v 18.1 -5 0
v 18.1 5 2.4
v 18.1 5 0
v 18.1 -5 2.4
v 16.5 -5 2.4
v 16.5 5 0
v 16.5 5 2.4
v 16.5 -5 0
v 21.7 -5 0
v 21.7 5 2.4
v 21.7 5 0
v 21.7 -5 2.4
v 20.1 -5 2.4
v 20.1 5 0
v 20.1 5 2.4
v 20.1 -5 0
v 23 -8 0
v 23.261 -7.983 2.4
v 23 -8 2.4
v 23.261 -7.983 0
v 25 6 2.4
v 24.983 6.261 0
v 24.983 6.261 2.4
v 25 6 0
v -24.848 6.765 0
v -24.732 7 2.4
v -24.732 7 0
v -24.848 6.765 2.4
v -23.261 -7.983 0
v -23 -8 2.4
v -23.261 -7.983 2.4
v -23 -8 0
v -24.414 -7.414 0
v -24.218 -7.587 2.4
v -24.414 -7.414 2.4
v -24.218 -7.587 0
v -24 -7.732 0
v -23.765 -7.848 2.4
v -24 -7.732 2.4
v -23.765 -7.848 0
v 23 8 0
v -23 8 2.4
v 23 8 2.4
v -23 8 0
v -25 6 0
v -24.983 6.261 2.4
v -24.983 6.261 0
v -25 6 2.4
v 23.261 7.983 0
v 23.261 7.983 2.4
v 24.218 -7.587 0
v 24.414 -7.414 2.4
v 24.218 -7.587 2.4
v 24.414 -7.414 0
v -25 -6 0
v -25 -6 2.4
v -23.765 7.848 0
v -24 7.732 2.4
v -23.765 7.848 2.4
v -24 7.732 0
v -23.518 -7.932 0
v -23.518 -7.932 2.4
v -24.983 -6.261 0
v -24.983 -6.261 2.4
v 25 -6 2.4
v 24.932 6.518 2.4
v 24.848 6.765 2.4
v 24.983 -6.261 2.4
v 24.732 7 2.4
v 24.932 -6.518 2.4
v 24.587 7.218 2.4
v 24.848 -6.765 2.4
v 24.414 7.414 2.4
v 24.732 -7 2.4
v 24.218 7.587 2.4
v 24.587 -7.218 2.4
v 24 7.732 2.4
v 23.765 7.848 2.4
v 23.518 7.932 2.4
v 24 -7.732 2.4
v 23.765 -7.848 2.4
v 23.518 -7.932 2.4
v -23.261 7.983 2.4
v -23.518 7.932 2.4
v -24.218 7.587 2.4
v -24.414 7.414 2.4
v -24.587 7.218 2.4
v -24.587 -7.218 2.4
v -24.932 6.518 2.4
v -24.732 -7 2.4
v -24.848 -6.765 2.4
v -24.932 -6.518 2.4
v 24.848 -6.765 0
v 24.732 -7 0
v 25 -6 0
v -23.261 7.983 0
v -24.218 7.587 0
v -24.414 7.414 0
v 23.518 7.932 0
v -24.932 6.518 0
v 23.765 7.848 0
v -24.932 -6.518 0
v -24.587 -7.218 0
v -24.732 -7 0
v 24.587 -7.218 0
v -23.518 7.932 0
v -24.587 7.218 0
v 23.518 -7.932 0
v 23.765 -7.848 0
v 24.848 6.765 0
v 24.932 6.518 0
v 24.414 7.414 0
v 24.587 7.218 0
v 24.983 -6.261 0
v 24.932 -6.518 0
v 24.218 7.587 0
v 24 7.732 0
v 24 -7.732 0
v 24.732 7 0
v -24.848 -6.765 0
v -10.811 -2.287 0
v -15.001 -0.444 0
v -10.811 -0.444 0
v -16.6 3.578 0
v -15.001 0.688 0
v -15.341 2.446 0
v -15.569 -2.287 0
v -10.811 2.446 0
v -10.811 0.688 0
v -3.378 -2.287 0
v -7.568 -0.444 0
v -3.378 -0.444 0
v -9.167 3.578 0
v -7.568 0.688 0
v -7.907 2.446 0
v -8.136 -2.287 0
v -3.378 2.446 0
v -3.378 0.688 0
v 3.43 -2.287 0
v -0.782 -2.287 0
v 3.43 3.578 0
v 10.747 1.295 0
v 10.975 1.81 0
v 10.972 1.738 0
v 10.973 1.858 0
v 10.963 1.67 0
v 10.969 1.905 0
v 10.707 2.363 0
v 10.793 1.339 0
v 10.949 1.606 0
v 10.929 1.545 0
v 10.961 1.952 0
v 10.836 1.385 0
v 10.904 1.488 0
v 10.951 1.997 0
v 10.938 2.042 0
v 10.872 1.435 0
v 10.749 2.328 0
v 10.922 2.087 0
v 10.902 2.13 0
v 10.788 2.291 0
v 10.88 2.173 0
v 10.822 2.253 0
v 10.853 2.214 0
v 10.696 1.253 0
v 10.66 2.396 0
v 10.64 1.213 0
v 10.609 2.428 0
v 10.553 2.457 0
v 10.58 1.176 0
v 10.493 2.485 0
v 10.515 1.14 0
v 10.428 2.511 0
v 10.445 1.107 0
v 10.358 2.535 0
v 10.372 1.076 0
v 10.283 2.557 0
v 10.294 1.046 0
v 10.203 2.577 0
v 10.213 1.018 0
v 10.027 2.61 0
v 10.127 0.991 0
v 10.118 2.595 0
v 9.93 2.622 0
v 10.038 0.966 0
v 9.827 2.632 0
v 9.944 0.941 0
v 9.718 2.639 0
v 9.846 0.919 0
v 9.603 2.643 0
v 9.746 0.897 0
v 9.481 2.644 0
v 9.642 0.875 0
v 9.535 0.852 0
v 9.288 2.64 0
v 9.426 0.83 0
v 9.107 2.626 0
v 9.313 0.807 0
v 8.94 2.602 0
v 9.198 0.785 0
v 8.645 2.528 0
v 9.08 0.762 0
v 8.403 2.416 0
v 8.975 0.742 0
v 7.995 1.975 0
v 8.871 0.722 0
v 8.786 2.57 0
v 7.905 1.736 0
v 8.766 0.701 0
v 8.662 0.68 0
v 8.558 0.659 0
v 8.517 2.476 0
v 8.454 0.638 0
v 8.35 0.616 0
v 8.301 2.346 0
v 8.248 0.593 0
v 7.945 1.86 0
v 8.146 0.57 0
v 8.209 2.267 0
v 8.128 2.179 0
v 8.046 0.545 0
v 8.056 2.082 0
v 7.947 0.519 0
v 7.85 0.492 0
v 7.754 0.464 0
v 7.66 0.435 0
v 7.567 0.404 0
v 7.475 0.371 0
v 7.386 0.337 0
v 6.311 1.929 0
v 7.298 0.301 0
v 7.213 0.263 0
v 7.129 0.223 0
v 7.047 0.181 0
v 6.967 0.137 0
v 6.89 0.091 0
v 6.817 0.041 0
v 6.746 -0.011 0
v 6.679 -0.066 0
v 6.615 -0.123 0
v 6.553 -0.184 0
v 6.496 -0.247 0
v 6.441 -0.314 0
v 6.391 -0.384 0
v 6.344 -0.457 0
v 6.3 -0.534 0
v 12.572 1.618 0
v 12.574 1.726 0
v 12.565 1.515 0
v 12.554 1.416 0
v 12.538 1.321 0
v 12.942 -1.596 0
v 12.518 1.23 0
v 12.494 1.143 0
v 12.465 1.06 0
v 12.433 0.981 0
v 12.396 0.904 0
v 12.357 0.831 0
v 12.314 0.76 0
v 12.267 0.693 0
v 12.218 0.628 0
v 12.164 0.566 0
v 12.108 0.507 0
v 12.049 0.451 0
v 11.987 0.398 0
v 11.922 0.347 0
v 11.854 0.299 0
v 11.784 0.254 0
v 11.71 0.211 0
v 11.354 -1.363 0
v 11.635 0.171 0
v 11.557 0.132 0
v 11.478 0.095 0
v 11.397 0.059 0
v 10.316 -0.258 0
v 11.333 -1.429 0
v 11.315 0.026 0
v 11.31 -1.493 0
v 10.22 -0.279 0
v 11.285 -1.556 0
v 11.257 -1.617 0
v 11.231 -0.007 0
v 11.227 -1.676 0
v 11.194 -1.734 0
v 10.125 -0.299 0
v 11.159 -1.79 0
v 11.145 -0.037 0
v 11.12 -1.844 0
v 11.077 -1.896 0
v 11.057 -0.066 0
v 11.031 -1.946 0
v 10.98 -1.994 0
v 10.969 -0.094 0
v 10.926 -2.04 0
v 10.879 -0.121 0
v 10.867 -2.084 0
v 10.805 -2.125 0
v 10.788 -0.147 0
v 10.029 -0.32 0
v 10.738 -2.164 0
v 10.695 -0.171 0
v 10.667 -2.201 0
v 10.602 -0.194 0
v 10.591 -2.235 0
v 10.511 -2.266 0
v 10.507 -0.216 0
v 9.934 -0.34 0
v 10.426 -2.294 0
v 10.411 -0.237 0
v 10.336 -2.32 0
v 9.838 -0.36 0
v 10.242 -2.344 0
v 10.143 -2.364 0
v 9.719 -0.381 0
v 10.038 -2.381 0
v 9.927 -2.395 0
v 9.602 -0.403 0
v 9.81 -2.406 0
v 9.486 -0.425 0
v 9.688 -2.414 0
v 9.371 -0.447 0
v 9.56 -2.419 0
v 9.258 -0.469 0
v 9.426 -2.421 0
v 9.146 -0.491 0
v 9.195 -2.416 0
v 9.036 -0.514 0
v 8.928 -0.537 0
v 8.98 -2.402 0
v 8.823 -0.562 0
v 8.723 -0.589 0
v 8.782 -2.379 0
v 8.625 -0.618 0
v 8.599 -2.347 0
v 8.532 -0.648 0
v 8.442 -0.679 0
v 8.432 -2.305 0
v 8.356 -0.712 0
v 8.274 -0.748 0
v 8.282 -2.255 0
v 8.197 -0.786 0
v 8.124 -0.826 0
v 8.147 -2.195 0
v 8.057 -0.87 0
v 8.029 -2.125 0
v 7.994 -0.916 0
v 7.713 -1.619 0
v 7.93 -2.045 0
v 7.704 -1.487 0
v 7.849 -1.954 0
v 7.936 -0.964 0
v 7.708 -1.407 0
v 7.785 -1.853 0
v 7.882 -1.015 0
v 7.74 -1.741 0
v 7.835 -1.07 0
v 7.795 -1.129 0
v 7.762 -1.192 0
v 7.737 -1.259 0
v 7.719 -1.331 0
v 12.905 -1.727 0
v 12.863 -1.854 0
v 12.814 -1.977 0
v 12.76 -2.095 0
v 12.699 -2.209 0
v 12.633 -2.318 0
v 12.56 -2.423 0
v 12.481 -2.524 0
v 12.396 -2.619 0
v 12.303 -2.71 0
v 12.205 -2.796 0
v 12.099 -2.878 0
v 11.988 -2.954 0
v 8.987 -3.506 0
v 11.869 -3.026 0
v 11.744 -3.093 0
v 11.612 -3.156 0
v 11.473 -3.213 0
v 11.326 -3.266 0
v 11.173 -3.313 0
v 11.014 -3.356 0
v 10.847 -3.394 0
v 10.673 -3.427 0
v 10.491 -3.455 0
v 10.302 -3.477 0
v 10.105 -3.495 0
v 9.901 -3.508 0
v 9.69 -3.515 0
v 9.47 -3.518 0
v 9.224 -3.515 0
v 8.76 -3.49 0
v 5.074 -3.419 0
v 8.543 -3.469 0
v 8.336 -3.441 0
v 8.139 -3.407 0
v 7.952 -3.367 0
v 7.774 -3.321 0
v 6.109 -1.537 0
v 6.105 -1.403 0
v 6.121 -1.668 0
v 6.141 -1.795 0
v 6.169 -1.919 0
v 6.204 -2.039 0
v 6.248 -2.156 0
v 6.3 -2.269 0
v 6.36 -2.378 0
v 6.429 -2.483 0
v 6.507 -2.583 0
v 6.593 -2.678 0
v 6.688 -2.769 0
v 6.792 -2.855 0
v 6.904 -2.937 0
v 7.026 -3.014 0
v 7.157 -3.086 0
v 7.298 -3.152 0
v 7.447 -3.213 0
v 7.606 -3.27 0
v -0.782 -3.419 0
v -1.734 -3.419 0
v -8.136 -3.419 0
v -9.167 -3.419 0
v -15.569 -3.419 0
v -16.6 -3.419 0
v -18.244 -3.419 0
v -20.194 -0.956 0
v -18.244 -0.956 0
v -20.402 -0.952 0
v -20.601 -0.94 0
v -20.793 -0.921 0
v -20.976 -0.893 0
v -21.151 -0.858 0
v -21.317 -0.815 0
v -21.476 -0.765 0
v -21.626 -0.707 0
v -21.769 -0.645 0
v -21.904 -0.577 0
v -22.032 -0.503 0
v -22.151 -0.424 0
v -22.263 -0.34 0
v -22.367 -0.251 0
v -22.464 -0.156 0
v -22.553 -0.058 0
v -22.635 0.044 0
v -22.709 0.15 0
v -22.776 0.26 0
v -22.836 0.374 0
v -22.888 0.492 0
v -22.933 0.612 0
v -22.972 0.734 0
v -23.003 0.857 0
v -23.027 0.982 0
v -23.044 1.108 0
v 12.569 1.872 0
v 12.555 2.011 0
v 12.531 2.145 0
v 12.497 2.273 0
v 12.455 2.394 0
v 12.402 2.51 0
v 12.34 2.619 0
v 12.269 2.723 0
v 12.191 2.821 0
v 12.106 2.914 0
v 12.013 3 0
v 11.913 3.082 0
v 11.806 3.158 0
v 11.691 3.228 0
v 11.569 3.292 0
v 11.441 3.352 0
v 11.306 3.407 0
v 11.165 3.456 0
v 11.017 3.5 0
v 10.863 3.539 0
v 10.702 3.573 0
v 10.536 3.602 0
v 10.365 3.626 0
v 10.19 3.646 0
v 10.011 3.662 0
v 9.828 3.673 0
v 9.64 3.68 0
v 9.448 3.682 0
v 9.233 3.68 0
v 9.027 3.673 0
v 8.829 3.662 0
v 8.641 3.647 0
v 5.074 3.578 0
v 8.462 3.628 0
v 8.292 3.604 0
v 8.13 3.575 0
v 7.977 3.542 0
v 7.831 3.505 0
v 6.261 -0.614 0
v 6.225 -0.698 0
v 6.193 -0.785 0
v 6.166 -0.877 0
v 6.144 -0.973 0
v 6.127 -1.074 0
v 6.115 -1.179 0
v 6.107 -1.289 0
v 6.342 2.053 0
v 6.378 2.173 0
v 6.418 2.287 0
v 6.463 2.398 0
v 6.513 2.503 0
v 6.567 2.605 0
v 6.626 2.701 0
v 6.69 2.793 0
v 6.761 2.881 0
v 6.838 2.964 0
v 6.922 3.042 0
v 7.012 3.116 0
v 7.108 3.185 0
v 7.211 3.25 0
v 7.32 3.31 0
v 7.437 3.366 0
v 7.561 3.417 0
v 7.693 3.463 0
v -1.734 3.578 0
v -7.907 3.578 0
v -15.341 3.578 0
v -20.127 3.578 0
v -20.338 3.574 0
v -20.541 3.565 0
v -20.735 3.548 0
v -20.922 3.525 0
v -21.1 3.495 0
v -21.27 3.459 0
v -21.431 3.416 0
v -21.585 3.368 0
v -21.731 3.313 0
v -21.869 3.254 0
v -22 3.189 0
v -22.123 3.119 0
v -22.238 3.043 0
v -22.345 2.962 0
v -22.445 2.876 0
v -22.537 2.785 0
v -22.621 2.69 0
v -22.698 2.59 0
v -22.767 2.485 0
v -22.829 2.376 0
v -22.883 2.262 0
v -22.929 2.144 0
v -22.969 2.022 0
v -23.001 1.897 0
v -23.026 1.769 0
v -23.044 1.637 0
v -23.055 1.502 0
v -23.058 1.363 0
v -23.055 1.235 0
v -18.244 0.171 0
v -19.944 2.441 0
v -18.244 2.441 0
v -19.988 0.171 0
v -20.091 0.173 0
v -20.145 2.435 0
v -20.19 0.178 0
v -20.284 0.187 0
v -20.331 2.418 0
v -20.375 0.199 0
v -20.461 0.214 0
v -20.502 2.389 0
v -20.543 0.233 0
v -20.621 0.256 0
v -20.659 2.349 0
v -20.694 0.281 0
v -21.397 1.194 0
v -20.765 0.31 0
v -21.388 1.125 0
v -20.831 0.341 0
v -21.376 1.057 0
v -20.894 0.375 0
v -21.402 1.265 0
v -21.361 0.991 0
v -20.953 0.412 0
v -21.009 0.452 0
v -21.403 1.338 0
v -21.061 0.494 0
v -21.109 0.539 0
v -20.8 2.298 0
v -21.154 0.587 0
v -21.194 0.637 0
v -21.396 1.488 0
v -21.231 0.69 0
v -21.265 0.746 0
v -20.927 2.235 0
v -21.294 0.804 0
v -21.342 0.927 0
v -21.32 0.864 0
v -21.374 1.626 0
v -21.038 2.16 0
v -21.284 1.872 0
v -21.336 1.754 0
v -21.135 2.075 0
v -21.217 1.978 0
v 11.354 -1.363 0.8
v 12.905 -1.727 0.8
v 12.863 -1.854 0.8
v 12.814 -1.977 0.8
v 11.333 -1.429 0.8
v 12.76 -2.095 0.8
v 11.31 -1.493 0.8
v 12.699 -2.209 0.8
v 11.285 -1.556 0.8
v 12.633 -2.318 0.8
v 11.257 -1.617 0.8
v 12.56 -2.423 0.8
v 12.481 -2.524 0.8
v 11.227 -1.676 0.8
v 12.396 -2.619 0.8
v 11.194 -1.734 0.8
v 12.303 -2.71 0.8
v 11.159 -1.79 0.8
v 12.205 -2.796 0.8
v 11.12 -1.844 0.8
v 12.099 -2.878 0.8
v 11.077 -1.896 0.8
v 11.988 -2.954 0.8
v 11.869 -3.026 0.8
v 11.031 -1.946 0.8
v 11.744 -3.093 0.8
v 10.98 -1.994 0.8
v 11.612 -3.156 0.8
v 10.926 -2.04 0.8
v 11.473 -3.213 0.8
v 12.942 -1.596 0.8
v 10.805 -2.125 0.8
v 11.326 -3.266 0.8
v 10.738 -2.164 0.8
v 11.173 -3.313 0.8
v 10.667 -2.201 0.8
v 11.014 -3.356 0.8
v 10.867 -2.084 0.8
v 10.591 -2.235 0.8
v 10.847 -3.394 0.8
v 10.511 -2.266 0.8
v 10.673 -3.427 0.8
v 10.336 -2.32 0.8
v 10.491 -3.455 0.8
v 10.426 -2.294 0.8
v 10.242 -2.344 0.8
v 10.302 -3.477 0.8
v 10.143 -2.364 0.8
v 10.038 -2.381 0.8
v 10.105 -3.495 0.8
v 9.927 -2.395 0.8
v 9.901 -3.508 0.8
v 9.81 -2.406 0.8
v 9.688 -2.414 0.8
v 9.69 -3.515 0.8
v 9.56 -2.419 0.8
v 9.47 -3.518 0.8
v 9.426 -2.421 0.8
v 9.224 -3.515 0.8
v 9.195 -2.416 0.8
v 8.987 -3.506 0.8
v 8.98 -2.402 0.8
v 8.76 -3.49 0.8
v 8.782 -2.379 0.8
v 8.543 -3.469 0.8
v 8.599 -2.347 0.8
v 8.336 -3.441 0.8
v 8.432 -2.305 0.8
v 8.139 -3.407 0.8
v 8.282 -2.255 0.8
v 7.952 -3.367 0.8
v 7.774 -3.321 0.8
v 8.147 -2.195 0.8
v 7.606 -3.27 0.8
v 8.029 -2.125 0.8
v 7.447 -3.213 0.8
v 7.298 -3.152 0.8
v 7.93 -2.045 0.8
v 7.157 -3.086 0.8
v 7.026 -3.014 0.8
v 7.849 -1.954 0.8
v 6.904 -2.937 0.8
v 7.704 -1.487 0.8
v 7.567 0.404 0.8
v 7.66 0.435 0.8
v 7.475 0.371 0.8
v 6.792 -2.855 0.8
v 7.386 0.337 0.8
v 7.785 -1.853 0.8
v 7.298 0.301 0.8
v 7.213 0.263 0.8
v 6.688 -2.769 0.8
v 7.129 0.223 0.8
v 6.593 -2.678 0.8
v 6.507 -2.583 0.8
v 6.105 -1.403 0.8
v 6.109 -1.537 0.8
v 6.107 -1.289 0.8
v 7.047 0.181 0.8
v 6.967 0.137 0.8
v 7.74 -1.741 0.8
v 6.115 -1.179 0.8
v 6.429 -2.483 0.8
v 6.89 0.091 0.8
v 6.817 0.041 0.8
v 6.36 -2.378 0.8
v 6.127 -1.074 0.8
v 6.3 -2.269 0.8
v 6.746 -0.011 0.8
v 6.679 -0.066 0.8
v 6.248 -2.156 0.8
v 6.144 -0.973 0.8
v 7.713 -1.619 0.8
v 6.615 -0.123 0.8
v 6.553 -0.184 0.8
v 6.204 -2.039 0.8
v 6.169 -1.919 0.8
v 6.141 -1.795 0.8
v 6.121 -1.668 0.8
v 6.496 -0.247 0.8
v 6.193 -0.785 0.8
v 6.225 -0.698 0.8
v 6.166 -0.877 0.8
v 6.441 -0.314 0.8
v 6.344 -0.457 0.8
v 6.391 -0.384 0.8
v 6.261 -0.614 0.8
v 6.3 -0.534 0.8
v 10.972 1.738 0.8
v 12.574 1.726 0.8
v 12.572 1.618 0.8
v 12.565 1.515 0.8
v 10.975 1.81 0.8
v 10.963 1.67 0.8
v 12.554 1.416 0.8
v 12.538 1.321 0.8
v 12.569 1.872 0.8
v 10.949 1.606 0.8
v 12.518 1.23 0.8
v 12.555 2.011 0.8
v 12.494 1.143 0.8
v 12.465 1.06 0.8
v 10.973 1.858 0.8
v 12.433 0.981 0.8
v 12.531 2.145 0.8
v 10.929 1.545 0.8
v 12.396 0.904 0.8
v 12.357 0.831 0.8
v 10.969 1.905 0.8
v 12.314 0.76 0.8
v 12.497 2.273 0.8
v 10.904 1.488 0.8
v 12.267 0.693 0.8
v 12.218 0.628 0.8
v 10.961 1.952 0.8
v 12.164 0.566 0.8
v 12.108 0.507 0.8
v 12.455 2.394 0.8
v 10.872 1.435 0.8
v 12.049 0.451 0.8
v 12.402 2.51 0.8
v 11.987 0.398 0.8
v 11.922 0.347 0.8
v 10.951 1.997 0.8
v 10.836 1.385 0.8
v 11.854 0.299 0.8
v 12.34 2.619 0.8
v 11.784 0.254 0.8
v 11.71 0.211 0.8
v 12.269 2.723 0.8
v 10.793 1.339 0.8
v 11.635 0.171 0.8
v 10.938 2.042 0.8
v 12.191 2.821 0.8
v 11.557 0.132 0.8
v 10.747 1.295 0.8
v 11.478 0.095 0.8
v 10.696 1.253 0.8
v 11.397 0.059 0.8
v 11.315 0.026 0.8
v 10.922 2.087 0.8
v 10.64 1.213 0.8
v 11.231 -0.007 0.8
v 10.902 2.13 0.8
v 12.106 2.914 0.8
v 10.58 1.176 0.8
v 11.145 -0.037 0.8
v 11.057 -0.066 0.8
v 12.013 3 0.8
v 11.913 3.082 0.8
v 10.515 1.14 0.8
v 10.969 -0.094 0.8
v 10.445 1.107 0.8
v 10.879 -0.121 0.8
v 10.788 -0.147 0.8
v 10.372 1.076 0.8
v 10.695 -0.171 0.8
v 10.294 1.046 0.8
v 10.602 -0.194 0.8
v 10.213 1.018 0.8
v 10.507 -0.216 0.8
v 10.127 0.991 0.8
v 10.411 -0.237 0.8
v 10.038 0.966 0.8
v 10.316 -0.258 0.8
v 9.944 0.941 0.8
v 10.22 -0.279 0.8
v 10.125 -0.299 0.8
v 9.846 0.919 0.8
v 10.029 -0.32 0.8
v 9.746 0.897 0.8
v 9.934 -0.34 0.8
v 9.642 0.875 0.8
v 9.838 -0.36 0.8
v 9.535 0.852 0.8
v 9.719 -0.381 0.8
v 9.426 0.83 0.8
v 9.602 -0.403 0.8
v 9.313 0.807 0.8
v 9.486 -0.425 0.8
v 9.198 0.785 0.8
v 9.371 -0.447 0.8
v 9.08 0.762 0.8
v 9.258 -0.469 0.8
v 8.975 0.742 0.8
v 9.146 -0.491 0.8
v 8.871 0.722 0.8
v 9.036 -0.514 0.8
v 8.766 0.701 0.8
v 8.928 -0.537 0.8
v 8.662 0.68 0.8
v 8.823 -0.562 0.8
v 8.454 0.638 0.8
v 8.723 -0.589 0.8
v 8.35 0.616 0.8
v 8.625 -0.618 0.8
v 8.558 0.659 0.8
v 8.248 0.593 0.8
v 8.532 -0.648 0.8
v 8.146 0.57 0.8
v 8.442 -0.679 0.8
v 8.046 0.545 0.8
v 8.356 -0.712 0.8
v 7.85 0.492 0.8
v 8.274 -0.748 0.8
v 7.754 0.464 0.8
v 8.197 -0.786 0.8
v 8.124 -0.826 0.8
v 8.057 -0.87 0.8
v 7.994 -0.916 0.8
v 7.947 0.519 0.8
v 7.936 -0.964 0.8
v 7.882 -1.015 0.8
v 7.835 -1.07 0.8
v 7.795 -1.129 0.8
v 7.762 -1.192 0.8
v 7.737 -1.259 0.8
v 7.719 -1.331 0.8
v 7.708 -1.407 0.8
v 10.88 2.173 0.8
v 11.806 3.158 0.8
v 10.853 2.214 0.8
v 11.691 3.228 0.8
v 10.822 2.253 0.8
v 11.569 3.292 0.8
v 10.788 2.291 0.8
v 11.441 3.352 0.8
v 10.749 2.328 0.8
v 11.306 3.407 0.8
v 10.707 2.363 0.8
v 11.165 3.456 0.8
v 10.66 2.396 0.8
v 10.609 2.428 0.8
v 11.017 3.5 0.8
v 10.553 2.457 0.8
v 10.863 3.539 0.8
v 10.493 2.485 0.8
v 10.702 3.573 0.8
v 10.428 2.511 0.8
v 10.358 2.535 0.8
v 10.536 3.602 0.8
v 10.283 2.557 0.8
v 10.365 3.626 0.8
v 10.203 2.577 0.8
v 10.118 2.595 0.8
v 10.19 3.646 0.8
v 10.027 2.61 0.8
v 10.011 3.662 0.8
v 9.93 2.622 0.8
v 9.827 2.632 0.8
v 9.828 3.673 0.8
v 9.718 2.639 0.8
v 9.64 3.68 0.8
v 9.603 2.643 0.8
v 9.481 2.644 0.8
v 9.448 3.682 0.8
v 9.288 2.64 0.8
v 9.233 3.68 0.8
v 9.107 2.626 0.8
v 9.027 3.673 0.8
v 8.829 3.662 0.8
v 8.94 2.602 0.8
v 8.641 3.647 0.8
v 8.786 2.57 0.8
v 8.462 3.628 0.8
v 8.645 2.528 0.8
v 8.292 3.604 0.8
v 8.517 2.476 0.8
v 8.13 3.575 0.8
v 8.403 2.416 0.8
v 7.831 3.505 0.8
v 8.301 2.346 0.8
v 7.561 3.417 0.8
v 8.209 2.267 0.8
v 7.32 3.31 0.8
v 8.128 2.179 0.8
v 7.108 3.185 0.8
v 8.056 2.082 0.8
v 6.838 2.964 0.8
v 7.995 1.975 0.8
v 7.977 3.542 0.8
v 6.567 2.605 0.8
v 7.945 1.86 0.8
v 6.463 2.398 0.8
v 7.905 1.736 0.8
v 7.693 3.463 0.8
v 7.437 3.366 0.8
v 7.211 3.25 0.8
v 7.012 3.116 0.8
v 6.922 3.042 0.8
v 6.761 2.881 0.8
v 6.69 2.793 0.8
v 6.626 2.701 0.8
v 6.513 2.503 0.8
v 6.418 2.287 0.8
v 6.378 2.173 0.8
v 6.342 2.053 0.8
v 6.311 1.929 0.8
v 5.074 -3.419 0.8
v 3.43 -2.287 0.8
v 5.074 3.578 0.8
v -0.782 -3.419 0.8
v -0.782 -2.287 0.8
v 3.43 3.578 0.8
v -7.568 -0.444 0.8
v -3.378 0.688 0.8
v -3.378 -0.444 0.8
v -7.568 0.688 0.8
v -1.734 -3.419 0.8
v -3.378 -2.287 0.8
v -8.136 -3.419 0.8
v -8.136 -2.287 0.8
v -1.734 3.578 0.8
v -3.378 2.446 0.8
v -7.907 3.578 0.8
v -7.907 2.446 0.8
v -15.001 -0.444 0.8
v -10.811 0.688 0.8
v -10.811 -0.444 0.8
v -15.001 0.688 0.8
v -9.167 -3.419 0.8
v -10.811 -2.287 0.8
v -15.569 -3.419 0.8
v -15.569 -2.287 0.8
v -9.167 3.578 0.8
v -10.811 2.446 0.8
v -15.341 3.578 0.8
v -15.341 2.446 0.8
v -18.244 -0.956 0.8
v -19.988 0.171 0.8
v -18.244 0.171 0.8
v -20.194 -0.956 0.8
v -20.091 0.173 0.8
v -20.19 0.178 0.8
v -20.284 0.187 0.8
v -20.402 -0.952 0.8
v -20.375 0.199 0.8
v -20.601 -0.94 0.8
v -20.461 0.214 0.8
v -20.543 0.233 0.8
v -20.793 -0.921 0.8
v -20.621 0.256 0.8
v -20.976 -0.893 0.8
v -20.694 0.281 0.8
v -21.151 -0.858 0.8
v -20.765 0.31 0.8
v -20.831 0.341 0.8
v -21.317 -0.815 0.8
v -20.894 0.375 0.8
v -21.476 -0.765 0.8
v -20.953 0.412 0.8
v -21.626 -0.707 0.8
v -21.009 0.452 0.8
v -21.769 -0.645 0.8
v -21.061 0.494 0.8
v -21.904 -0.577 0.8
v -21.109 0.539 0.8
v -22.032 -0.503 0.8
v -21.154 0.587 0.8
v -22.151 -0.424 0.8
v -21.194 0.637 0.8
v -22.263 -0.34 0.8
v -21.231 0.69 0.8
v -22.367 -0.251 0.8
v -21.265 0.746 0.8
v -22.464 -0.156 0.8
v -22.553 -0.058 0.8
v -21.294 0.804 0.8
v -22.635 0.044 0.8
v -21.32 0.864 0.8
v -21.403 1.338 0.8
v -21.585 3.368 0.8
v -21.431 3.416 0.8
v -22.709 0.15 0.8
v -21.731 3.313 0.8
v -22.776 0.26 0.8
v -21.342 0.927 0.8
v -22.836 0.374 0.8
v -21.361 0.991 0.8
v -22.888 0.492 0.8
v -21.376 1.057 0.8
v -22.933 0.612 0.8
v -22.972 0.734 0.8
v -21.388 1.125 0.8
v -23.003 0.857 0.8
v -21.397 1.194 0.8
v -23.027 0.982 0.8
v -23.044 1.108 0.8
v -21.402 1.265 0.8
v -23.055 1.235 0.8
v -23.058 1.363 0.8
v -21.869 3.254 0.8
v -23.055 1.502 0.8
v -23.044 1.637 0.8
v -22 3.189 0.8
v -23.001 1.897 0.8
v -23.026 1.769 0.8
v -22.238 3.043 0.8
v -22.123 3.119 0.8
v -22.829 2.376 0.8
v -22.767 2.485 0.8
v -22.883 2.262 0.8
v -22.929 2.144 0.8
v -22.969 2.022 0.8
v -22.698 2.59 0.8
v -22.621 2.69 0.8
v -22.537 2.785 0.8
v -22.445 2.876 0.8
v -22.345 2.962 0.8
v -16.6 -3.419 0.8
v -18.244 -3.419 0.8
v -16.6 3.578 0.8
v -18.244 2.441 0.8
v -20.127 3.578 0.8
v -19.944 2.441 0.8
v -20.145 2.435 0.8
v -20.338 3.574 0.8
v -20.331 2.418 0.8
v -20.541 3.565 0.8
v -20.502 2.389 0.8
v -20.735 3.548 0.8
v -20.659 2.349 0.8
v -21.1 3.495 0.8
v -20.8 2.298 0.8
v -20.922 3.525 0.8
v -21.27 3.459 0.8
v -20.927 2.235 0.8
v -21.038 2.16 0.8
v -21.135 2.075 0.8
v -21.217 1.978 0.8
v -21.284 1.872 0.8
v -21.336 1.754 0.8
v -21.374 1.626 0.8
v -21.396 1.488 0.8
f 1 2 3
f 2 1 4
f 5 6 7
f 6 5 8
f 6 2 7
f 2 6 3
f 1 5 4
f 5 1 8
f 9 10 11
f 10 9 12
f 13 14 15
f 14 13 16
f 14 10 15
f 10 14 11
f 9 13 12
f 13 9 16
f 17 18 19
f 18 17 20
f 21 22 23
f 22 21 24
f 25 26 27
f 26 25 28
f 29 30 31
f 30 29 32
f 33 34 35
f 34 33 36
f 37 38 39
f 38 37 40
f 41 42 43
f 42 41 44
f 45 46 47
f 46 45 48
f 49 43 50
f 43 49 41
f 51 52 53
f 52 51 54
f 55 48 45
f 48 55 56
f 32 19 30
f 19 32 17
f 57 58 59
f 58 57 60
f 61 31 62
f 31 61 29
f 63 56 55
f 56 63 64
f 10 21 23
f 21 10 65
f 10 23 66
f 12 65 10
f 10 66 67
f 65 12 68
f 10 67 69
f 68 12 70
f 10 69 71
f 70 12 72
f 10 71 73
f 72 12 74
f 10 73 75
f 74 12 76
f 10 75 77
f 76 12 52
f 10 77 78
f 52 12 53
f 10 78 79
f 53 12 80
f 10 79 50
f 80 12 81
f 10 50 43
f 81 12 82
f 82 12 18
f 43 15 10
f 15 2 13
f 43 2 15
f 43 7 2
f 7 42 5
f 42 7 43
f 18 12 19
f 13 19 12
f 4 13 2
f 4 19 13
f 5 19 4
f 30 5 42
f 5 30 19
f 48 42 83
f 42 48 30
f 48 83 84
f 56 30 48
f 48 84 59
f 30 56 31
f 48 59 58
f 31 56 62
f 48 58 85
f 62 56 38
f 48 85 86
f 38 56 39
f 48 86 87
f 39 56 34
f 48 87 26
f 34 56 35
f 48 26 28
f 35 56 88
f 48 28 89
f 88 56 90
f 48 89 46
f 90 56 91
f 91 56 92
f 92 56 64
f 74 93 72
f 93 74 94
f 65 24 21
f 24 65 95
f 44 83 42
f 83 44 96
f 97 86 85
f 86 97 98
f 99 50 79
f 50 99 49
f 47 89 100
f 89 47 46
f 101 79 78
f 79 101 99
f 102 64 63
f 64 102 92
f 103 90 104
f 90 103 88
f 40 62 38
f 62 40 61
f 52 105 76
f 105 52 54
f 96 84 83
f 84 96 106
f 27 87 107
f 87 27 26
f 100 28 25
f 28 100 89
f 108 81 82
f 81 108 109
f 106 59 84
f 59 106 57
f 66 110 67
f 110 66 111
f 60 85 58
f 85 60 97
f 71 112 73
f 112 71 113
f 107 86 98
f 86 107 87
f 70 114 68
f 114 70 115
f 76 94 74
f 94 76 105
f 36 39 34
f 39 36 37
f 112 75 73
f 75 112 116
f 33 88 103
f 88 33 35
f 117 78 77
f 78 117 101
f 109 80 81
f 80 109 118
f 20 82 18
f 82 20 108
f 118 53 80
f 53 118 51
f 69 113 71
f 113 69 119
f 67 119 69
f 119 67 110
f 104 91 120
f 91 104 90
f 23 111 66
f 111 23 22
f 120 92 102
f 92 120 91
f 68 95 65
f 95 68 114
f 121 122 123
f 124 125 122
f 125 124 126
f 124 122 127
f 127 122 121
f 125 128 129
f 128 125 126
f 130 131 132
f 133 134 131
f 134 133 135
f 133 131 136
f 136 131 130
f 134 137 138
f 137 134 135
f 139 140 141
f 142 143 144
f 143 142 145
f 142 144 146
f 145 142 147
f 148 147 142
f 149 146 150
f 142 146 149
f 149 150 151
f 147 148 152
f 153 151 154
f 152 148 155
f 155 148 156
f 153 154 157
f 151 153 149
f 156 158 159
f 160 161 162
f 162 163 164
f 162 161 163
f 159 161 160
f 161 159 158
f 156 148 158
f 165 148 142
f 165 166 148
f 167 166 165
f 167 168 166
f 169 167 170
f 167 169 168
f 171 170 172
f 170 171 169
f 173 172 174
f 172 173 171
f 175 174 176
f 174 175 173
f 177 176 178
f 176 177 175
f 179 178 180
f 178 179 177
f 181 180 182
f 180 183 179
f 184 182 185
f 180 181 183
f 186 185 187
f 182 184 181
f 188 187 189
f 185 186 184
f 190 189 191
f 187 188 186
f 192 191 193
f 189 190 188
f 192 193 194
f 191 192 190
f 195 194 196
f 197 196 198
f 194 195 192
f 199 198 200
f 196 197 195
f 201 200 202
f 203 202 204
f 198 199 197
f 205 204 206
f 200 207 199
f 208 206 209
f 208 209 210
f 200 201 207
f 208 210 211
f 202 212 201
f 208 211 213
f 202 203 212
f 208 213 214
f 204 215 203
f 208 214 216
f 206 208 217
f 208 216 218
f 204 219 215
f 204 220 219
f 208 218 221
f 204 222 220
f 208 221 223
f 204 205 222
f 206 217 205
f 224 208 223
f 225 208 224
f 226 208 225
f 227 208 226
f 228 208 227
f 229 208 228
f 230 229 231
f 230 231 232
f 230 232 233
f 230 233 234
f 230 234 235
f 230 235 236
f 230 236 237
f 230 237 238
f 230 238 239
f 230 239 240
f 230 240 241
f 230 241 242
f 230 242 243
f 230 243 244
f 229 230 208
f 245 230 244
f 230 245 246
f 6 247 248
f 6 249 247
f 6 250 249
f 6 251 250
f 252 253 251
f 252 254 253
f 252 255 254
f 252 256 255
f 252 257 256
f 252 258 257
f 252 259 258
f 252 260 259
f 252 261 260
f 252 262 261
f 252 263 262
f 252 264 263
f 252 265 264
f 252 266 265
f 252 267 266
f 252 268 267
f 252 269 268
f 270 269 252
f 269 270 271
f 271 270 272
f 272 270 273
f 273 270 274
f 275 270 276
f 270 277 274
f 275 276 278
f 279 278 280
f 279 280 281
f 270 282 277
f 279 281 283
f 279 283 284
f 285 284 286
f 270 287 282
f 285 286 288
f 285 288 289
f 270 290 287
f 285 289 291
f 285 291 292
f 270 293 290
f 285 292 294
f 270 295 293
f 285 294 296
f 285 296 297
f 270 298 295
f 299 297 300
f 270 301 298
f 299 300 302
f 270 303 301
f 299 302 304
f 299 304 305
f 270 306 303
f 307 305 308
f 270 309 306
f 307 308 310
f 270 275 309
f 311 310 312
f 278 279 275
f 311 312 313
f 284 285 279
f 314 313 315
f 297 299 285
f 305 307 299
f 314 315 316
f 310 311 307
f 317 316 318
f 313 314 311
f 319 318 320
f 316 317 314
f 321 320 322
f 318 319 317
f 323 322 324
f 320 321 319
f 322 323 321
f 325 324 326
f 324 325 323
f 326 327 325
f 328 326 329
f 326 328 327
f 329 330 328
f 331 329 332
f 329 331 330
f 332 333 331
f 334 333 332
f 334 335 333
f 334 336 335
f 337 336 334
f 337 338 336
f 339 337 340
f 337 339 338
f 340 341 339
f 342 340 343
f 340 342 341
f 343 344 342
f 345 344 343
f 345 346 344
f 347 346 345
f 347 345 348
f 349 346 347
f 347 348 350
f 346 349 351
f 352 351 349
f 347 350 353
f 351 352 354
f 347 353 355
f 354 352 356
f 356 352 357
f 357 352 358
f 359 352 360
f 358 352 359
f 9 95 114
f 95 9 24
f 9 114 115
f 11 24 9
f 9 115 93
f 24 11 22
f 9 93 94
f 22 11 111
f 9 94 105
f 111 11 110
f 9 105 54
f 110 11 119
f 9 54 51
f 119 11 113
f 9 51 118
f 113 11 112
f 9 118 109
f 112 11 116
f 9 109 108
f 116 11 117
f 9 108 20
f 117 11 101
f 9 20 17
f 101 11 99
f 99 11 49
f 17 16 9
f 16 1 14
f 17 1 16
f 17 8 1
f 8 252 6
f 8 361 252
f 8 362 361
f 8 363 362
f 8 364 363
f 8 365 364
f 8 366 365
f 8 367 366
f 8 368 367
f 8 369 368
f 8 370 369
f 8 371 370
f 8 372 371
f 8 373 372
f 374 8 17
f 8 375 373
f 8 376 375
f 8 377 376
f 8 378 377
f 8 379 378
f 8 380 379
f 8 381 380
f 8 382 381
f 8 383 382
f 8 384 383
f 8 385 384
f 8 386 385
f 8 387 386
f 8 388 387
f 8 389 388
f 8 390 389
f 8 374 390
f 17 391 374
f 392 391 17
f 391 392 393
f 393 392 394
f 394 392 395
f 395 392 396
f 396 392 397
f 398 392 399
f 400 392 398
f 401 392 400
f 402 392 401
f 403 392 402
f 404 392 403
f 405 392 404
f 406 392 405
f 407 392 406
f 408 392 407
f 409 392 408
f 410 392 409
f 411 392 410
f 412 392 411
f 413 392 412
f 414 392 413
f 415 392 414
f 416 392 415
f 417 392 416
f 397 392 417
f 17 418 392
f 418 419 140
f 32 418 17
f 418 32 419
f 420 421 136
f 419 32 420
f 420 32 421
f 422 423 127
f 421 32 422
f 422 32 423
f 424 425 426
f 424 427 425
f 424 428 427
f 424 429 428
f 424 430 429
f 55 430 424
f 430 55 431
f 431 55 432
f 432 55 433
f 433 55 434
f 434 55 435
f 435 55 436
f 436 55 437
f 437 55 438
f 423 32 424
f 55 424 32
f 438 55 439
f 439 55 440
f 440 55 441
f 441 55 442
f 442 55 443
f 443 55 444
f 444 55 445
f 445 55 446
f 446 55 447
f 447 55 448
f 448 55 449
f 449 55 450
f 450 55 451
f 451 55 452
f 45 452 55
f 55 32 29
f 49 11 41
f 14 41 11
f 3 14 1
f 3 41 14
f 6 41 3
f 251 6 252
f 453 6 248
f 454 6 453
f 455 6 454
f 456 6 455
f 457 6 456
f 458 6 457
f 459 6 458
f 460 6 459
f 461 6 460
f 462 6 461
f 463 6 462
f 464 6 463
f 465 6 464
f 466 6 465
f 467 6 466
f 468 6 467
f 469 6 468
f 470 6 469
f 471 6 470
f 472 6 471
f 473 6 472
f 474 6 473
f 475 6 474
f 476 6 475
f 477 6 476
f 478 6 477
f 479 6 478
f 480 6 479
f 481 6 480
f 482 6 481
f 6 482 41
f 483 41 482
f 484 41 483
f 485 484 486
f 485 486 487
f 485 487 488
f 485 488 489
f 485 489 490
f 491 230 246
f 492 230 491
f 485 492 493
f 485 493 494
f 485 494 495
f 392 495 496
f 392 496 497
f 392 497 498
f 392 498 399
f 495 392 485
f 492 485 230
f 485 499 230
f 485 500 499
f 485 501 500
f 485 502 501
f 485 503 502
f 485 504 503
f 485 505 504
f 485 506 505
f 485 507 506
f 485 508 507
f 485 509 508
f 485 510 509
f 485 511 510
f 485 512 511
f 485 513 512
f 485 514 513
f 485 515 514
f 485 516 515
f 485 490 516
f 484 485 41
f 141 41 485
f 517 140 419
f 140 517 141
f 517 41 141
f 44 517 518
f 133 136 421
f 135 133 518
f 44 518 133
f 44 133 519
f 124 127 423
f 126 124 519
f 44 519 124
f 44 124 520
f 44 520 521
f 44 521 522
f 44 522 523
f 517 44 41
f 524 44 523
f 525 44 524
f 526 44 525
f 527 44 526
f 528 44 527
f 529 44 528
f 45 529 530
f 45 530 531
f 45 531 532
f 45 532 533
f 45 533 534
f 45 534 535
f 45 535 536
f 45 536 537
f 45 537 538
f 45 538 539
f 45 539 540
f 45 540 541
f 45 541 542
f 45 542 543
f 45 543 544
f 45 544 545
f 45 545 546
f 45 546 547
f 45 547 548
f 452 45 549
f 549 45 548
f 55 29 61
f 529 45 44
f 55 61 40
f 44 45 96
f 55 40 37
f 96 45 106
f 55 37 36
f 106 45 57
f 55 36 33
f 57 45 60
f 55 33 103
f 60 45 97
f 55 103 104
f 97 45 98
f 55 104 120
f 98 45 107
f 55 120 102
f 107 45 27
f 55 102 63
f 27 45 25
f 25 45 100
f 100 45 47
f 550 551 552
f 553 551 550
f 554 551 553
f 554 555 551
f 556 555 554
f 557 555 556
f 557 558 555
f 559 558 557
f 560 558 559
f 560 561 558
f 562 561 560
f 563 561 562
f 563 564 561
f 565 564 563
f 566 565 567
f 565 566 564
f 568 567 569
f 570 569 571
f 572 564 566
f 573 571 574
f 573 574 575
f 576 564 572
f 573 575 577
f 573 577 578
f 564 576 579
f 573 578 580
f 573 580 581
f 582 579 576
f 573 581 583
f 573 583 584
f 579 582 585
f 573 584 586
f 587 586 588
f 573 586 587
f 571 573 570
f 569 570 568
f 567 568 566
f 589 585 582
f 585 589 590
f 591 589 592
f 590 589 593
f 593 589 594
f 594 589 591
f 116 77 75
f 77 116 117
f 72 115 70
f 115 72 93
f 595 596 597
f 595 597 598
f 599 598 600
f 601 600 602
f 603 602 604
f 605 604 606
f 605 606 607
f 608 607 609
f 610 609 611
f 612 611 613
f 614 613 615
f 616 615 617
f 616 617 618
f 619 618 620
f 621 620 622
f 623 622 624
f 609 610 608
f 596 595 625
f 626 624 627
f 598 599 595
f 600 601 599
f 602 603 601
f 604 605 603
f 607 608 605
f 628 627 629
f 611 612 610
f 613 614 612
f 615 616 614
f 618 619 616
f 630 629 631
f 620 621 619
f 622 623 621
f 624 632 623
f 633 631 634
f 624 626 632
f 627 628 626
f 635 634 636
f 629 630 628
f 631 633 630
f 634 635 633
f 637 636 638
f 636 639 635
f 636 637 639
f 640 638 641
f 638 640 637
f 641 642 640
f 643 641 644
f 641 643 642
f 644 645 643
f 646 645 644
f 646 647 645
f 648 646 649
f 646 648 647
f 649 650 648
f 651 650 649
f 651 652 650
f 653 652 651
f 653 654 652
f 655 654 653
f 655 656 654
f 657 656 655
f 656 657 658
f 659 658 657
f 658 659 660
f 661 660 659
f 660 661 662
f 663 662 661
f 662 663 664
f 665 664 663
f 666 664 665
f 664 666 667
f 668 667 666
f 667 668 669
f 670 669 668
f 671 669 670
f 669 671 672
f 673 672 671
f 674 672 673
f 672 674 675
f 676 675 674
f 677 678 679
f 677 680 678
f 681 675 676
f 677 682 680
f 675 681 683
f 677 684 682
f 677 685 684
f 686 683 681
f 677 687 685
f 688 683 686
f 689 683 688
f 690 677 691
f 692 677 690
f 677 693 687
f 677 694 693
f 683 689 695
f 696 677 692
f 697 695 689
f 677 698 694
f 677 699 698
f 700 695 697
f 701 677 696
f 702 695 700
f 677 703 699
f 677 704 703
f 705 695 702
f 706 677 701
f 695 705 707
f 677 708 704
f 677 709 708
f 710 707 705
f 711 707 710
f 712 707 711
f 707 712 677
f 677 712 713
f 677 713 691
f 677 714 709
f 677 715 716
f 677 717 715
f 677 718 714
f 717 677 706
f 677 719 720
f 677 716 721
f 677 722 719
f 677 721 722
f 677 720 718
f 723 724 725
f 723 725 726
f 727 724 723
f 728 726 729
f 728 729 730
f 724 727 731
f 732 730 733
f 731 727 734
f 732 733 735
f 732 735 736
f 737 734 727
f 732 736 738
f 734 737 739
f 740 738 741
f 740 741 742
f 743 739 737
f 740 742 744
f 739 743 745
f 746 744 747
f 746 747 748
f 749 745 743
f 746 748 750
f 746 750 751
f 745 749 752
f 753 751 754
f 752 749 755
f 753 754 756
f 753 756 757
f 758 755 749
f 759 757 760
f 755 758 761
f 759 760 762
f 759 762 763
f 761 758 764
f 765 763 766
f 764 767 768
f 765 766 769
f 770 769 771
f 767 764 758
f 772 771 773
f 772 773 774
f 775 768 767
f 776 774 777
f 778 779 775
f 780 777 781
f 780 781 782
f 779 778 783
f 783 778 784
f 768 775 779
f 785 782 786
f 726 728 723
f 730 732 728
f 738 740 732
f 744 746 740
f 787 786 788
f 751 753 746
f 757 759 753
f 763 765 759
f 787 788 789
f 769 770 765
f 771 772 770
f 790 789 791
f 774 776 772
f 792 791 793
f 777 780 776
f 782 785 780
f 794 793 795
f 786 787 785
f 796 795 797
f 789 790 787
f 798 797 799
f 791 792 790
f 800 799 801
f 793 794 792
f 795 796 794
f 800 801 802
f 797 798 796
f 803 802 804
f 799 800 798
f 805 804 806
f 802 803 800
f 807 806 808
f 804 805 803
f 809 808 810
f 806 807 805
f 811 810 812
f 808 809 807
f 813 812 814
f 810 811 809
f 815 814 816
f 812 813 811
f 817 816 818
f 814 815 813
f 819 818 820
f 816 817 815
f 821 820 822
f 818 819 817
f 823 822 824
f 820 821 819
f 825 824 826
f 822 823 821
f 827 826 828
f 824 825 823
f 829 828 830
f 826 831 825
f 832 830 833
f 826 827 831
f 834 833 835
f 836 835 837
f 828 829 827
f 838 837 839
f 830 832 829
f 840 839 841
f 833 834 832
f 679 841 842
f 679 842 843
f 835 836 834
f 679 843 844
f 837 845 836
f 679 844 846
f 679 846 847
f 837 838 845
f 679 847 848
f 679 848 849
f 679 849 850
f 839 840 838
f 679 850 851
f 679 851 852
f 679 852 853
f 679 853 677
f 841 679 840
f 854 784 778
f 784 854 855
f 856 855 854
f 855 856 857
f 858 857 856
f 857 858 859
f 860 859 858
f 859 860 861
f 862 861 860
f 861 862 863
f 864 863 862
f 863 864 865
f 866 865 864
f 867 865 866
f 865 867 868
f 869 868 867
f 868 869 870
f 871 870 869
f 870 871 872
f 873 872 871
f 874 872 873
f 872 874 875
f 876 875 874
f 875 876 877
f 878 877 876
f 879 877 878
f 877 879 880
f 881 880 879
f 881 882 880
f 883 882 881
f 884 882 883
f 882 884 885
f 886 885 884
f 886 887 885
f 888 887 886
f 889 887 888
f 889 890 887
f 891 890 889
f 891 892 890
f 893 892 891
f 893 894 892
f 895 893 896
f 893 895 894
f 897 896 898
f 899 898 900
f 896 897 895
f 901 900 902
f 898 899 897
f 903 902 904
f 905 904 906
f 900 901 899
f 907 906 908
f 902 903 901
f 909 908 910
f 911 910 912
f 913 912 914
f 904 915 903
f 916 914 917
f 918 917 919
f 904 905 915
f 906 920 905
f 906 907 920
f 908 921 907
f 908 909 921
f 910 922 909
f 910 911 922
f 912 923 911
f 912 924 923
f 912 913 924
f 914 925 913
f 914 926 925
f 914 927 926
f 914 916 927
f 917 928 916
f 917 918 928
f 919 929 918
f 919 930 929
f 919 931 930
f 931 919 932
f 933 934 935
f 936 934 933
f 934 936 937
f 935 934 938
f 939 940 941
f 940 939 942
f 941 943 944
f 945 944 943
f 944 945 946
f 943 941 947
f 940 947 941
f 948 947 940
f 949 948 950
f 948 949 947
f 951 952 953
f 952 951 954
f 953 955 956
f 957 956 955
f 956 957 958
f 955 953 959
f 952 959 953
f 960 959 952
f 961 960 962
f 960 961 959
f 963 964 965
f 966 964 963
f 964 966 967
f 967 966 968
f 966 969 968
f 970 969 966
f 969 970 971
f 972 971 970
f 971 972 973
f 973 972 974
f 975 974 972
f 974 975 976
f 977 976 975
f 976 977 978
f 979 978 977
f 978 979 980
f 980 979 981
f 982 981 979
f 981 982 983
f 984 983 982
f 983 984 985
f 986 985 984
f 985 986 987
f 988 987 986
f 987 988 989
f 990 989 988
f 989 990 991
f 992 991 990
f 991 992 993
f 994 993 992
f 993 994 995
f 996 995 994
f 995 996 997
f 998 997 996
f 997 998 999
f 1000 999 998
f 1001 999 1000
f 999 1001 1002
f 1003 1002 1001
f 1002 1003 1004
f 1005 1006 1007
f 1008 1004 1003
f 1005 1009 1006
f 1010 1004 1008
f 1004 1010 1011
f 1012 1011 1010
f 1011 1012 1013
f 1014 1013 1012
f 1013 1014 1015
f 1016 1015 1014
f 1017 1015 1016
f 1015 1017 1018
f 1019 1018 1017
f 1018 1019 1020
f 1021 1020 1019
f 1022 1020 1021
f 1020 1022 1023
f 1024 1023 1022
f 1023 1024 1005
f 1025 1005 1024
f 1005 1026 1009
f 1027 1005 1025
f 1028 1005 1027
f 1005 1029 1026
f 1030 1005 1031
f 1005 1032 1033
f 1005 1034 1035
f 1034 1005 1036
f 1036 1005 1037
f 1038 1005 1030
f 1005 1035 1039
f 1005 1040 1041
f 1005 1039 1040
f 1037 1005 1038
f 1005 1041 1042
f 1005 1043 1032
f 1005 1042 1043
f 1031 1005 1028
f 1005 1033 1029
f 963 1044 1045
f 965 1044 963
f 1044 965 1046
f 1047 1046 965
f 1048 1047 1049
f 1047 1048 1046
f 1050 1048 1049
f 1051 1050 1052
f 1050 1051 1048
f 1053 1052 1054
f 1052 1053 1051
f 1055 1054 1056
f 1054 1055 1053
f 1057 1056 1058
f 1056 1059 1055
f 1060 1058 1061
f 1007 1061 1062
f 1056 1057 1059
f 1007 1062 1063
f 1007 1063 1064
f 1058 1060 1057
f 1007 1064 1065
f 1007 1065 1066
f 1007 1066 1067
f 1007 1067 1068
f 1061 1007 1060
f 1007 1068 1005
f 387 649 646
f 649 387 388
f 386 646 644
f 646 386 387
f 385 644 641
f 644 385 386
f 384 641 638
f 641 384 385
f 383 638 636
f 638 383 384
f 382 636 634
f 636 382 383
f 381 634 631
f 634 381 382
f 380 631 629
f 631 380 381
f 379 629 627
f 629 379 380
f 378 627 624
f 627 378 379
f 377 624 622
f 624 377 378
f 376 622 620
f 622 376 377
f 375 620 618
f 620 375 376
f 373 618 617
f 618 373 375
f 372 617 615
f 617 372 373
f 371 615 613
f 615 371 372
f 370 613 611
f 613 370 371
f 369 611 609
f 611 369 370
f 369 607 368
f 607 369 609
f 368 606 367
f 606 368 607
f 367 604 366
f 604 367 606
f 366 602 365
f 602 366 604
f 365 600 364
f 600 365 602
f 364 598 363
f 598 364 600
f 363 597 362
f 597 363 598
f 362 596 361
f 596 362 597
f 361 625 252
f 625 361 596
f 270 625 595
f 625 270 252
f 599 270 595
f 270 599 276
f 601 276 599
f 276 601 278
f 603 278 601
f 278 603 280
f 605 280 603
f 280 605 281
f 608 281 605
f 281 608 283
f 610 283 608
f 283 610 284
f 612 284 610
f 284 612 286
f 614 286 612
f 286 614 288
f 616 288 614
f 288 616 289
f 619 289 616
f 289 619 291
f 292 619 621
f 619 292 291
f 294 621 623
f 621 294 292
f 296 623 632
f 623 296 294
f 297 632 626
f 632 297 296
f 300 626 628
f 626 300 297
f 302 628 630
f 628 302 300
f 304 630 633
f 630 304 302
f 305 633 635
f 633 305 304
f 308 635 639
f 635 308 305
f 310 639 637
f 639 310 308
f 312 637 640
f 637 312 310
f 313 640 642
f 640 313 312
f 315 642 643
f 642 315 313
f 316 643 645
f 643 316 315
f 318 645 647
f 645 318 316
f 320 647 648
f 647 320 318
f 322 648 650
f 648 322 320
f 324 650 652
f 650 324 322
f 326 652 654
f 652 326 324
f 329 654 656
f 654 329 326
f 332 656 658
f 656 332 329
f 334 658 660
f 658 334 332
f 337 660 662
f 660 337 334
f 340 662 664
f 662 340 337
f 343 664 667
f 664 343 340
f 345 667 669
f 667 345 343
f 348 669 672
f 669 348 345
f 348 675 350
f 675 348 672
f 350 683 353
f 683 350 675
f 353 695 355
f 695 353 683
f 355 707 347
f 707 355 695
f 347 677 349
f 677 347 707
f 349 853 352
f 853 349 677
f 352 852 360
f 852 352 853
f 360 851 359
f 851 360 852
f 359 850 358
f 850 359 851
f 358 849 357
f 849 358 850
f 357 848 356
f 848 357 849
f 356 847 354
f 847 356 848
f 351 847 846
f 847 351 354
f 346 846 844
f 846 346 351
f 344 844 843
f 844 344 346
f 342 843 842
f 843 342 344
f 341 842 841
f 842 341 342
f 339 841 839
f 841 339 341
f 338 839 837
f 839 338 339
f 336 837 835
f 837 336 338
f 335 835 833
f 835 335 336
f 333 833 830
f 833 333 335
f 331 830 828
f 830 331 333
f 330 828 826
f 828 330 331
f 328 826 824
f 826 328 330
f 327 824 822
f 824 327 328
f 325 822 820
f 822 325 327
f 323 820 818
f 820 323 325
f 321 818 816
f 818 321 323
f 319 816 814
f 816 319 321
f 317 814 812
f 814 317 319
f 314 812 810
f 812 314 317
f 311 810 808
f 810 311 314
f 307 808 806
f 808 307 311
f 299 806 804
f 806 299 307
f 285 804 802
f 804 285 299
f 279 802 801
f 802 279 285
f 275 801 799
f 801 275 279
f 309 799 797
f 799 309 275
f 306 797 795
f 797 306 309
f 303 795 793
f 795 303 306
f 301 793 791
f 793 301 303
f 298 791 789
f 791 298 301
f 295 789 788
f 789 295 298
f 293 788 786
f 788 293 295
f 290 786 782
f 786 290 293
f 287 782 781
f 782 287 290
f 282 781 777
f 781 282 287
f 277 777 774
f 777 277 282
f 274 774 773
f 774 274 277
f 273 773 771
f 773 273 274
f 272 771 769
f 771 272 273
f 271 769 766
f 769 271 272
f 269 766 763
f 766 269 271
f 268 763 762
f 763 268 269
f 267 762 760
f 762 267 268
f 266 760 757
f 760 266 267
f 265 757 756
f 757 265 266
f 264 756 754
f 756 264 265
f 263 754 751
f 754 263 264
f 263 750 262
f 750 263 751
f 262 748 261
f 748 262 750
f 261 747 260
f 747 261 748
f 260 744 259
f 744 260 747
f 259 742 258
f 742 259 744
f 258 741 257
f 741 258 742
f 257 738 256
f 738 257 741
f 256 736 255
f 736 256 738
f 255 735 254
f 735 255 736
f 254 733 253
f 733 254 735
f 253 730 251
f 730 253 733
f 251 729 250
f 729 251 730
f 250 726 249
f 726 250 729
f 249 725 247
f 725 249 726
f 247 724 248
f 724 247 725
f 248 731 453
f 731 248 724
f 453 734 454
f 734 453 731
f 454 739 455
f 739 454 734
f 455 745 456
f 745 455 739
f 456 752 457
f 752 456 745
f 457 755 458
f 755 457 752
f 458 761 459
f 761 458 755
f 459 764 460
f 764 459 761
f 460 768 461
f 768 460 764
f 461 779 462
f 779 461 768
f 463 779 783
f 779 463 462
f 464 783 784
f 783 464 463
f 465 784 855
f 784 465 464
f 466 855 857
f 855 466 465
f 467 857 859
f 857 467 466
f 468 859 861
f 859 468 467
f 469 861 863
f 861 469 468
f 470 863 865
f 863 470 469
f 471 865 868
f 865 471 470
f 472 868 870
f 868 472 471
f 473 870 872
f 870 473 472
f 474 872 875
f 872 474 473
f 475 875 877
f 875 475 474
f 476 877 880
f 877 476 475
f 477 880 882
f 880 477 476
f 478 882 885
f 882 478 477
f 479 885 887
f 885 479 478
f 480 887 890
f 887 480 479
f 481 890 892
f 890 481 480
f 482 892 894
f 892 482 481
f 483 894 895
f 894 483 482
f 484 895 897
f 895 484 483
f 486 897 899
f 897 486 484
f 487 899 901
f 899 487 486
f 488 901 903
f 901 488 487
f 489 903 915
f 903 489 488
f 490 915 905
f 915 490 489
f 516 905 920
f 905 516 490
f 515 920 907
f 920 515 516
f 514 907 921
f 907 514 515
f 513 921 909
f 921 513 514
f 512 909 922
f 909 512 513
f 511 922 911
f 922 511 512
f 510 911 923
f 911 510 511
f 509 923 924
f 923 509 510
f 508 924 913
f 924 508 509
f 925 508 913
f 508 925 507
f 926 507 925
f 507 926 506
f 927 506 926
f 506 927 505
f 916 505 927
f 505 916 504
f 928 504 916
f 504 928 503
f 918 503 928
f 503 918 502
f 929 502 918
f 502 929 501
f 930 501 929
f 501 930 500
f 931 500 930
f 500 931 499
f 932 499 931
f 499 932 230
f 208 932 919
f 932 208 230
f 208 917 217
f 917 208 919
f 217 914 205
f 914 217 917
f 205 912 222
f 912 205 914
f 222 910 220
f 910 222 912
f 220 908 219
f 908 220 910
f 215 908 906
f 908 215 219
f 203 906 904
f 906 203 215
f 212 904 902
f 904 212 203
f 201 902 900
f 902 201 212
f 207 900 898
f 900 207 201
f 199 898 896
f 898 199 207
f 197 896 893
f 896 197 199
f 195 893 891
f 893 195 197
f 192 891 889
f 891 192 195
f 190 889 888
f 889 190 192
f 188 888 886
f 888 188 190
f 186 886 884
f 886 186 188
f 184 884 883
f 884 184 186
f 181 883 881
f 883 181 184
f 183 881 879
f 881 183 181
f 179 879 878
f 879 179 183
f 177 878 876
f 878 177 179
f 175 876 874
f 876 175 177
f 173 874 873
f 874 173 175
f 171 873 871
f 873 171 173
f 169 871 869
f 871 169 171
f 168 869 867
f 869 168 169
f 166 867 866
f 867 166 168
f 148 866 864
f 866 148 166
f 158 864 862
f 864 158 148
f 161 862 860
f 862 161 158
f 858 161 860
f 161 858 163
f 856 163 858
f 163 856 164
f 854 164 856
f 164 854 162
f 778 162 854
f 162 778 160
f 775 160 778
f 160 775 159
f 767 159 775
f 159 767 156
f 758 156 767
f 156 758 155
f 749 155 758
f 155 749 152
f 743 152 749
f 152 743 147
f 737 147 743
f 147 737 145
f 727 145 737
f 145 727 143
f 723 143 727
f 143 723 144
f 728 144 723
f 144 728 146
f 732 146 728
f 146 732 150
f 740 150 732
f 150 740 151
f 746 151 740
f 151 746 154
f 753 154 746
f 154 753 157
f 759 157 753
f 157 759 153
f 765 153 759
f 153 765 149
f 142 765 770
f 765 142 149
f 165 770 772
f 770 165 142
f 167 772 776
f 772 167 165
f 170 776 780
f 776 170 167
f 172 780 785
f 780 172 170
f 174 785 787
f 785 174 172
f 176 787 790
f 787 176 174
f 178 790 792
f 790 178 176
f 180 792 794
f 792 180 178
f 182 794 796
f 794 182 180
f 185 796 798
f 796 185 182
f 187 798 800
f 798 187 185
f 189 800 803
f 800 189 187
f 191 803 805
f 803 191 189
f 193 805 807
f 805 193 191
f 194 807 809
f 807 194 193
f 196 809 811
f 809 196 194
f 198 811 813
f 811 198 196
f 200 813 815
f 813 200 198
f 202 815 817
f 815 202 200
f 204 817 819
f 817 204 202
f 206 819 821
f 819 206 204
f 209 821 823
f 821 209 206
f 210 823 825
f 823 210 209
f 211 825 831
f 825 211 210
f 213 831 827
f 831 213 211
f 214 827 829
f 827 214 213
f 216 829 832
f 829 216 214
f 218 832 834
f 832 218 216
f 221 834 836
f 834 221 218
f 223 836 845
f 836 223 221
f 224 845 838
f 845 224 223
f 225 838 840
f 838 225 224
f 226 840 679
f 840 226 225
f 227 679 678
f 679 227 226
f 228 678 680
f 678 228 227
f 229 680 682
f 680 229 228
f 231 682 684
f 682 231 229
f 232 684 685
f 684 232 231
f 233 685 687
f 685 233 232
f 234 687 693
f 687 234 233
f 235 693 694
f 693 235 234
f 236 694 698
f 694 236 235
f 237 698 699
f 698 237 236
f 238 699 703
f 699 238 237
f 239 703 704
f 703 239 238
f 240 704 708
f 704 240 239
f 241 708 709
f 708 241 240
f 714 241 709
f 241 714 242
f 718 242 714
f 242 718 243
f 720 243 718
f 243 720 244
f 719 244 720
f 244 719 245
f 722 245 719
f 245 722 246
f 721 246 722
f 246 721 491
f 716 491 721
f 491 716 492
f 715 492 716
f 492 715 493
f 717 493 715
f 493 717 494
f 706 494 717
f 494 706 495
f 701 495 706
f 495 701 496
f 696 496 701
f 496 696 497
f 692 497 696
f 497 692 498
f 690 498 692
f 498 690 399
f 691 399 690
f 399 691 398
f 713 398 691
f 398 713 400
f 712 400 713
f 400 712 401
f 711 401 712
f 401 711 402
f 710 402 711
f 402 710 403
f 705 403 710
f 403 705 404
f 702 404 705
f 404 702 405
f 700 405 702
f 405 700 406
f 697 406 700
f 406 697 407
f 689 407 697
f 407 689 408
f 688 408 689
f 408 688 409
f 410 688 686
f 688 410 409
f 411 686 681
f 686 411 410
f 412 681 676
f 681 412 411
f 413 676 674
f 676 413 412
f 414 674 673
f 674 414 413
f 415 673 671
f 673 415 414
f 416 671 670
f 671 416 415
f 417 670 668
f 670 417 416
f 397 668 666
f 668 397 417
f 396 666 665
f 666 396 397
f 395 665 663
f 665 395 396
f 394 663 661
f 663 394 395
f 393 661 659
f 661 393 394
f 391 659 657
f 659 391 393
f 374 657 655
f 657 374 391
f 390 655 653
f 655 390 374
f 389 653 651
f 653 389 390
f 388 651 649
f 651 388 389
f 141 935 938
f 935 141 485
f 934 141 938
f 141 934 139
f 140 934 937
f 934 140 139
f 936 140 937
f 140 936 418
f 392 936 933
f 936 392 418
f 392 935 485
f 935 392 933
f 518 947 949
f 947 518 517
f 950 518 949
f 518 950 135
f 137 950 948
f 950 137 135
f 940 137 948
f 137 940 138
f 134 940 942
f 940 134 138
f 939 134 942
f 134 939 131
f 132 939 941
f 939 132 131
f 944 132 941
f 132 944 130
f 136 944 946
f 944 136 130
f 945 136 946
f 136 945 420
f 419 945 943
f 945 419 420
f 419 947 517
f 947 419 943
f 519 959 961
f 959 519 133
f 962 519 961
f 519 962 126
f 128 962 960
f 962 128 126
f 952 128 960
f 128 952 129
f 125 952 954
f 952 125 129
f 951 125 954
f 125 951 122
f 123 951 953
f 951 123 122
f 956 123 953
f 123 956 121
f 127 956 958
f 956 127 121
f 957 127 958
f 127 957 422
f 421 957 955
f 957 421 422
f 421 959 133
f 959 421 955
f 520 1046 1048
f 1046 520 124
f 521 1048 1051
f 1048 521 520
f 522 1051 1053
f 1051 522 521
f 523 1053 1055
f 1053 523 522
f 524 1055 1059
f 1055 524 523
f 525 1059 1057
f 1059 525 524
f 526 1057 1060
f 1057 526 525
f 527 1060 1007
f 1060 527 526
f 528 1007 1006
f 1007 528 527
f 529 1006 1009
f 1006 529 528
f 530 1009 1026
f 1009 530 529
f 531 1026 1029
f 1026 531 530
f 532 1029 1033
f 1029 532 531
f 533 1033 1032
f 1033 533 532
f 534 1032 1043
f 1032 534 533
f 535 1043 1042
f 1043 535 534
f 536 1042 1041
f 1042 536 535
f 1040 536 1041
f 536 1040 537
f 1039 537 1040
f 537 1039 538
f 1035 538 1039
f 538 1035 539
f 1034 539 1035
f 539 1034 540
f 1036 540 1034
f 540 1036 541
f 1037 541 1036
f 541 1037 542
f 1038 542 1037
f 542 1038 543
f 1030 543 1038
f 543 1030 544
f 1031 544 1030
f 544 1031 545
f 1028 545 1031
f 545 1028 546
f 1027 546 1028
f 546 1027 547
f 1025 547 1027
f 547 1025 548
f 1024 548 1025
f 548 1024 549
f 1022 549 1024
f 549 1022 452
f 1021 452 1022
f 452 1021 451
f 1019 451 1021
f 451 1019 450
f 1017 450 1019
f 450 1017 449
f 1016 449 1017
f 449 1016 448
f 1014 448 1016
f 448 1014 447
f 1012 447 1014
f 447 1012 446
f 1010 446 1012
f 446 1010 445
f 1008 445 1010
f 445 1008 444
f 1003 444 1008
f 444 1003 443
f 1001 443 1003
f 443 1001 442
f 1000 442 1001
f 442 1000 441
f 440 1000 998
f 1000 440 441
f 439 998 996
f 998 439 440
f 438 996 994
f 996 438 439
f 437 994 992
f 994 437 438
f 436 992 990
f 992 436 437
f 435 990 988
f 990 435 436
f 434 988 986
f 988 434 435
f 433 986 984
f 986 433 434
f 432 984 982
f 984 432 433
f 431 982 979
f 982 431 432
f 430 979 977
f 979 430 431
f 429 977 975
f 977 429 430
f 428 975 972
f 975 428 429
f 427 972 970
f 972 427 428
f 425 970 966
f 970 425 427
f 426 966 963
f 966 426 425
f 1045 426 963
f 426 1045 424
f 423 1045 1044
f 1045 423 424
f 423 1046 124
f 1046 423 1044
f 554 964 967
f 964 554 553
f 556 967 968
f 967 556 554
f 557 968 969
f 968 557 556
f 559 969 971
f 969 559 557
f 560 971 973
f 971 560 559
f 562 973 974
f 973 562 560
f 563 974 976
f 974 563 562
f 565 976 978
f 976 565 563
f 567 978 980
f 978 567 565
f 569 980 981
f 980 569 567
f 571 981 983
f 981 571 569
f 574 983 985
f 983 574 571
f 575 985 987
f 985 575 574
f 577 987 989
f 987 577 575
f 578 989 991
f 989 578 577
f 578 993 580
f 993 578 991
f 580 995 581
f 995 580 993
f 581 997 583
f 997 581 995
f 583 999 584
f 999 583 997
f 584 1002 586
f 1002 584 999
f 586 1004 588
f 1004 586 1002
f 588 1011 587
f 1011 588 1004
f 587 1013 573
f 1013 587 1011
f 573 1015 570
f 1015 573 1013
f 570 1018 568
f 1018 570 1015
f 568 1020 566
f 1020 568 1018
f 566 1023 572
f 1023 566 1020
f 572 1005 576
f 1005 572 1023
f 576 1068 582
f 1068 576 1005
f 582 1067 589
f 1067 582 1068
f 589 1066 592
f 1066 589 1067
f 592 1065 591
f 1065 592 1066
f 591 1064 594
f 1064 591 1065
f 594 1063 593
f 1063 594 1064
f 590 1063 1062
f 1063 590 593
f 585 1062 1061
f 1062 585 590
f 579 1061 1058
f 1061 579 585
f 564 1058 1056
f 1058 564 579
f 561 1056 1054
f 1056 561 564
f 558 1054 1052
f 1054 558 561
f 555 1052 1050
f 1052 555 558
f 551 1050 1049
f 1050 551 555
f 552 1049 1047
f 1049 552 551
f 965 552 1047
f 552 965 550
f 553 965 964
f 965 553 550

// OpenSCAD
// A small test for the two-tone fronts (see twotone/ and the README's
// "Two-tone front"): "SLEEP" at the front's lettering size and font, the same
// 0.8 mm depth and the same filament changes, on a small tile that prints in
// about 9 minutes -- so the colour change can be tried before the 3.5-hour
// front panel.
//
// Printed face down like the front: the lettering is cut into the bottom face,
// mirrored so it reads the right way round when the tile is turned over. The
// two slots show what the grille's slots will look like.
//
//   openscad --backend=manifold -o stl/twotone_test.stl twotone_test.scad

tile   = [50, 16, 2.4];   // 2.4 mm, like the grille: 4 face + 4 blue + 4 white layers
depth  = 0.8;             // = logo_depth in sleepradiopi_box.scad (4 layers at 0.2 mm)
size   = [36, 7.2];       // one line of the front's lettering (logo_w, logo_line_h())
font   = "Liberation Sans:style=Bold";   // = logo_font

$fn = 48;

difference() {
    linear_extrude(tile[2])
        offset(r = 2) offset(delta = -2) square([tile[0], tile[1]], center = true);
    // the lettering, cut into the face (the bottom)
    translate([-5, 0, -1]) linear_extrude(1 + depth)
        mirror([1, 0, 0]) resize(size) text("SLEEP", size = 10, font = font, halign = "center", valign = "center");
    // grille-like slots, right through
    for (i = [0 : 1])
        translate([16.5 + i * 3.6, -5, -1]) cube([1.6, 10, tile[2] + 2]);
}
